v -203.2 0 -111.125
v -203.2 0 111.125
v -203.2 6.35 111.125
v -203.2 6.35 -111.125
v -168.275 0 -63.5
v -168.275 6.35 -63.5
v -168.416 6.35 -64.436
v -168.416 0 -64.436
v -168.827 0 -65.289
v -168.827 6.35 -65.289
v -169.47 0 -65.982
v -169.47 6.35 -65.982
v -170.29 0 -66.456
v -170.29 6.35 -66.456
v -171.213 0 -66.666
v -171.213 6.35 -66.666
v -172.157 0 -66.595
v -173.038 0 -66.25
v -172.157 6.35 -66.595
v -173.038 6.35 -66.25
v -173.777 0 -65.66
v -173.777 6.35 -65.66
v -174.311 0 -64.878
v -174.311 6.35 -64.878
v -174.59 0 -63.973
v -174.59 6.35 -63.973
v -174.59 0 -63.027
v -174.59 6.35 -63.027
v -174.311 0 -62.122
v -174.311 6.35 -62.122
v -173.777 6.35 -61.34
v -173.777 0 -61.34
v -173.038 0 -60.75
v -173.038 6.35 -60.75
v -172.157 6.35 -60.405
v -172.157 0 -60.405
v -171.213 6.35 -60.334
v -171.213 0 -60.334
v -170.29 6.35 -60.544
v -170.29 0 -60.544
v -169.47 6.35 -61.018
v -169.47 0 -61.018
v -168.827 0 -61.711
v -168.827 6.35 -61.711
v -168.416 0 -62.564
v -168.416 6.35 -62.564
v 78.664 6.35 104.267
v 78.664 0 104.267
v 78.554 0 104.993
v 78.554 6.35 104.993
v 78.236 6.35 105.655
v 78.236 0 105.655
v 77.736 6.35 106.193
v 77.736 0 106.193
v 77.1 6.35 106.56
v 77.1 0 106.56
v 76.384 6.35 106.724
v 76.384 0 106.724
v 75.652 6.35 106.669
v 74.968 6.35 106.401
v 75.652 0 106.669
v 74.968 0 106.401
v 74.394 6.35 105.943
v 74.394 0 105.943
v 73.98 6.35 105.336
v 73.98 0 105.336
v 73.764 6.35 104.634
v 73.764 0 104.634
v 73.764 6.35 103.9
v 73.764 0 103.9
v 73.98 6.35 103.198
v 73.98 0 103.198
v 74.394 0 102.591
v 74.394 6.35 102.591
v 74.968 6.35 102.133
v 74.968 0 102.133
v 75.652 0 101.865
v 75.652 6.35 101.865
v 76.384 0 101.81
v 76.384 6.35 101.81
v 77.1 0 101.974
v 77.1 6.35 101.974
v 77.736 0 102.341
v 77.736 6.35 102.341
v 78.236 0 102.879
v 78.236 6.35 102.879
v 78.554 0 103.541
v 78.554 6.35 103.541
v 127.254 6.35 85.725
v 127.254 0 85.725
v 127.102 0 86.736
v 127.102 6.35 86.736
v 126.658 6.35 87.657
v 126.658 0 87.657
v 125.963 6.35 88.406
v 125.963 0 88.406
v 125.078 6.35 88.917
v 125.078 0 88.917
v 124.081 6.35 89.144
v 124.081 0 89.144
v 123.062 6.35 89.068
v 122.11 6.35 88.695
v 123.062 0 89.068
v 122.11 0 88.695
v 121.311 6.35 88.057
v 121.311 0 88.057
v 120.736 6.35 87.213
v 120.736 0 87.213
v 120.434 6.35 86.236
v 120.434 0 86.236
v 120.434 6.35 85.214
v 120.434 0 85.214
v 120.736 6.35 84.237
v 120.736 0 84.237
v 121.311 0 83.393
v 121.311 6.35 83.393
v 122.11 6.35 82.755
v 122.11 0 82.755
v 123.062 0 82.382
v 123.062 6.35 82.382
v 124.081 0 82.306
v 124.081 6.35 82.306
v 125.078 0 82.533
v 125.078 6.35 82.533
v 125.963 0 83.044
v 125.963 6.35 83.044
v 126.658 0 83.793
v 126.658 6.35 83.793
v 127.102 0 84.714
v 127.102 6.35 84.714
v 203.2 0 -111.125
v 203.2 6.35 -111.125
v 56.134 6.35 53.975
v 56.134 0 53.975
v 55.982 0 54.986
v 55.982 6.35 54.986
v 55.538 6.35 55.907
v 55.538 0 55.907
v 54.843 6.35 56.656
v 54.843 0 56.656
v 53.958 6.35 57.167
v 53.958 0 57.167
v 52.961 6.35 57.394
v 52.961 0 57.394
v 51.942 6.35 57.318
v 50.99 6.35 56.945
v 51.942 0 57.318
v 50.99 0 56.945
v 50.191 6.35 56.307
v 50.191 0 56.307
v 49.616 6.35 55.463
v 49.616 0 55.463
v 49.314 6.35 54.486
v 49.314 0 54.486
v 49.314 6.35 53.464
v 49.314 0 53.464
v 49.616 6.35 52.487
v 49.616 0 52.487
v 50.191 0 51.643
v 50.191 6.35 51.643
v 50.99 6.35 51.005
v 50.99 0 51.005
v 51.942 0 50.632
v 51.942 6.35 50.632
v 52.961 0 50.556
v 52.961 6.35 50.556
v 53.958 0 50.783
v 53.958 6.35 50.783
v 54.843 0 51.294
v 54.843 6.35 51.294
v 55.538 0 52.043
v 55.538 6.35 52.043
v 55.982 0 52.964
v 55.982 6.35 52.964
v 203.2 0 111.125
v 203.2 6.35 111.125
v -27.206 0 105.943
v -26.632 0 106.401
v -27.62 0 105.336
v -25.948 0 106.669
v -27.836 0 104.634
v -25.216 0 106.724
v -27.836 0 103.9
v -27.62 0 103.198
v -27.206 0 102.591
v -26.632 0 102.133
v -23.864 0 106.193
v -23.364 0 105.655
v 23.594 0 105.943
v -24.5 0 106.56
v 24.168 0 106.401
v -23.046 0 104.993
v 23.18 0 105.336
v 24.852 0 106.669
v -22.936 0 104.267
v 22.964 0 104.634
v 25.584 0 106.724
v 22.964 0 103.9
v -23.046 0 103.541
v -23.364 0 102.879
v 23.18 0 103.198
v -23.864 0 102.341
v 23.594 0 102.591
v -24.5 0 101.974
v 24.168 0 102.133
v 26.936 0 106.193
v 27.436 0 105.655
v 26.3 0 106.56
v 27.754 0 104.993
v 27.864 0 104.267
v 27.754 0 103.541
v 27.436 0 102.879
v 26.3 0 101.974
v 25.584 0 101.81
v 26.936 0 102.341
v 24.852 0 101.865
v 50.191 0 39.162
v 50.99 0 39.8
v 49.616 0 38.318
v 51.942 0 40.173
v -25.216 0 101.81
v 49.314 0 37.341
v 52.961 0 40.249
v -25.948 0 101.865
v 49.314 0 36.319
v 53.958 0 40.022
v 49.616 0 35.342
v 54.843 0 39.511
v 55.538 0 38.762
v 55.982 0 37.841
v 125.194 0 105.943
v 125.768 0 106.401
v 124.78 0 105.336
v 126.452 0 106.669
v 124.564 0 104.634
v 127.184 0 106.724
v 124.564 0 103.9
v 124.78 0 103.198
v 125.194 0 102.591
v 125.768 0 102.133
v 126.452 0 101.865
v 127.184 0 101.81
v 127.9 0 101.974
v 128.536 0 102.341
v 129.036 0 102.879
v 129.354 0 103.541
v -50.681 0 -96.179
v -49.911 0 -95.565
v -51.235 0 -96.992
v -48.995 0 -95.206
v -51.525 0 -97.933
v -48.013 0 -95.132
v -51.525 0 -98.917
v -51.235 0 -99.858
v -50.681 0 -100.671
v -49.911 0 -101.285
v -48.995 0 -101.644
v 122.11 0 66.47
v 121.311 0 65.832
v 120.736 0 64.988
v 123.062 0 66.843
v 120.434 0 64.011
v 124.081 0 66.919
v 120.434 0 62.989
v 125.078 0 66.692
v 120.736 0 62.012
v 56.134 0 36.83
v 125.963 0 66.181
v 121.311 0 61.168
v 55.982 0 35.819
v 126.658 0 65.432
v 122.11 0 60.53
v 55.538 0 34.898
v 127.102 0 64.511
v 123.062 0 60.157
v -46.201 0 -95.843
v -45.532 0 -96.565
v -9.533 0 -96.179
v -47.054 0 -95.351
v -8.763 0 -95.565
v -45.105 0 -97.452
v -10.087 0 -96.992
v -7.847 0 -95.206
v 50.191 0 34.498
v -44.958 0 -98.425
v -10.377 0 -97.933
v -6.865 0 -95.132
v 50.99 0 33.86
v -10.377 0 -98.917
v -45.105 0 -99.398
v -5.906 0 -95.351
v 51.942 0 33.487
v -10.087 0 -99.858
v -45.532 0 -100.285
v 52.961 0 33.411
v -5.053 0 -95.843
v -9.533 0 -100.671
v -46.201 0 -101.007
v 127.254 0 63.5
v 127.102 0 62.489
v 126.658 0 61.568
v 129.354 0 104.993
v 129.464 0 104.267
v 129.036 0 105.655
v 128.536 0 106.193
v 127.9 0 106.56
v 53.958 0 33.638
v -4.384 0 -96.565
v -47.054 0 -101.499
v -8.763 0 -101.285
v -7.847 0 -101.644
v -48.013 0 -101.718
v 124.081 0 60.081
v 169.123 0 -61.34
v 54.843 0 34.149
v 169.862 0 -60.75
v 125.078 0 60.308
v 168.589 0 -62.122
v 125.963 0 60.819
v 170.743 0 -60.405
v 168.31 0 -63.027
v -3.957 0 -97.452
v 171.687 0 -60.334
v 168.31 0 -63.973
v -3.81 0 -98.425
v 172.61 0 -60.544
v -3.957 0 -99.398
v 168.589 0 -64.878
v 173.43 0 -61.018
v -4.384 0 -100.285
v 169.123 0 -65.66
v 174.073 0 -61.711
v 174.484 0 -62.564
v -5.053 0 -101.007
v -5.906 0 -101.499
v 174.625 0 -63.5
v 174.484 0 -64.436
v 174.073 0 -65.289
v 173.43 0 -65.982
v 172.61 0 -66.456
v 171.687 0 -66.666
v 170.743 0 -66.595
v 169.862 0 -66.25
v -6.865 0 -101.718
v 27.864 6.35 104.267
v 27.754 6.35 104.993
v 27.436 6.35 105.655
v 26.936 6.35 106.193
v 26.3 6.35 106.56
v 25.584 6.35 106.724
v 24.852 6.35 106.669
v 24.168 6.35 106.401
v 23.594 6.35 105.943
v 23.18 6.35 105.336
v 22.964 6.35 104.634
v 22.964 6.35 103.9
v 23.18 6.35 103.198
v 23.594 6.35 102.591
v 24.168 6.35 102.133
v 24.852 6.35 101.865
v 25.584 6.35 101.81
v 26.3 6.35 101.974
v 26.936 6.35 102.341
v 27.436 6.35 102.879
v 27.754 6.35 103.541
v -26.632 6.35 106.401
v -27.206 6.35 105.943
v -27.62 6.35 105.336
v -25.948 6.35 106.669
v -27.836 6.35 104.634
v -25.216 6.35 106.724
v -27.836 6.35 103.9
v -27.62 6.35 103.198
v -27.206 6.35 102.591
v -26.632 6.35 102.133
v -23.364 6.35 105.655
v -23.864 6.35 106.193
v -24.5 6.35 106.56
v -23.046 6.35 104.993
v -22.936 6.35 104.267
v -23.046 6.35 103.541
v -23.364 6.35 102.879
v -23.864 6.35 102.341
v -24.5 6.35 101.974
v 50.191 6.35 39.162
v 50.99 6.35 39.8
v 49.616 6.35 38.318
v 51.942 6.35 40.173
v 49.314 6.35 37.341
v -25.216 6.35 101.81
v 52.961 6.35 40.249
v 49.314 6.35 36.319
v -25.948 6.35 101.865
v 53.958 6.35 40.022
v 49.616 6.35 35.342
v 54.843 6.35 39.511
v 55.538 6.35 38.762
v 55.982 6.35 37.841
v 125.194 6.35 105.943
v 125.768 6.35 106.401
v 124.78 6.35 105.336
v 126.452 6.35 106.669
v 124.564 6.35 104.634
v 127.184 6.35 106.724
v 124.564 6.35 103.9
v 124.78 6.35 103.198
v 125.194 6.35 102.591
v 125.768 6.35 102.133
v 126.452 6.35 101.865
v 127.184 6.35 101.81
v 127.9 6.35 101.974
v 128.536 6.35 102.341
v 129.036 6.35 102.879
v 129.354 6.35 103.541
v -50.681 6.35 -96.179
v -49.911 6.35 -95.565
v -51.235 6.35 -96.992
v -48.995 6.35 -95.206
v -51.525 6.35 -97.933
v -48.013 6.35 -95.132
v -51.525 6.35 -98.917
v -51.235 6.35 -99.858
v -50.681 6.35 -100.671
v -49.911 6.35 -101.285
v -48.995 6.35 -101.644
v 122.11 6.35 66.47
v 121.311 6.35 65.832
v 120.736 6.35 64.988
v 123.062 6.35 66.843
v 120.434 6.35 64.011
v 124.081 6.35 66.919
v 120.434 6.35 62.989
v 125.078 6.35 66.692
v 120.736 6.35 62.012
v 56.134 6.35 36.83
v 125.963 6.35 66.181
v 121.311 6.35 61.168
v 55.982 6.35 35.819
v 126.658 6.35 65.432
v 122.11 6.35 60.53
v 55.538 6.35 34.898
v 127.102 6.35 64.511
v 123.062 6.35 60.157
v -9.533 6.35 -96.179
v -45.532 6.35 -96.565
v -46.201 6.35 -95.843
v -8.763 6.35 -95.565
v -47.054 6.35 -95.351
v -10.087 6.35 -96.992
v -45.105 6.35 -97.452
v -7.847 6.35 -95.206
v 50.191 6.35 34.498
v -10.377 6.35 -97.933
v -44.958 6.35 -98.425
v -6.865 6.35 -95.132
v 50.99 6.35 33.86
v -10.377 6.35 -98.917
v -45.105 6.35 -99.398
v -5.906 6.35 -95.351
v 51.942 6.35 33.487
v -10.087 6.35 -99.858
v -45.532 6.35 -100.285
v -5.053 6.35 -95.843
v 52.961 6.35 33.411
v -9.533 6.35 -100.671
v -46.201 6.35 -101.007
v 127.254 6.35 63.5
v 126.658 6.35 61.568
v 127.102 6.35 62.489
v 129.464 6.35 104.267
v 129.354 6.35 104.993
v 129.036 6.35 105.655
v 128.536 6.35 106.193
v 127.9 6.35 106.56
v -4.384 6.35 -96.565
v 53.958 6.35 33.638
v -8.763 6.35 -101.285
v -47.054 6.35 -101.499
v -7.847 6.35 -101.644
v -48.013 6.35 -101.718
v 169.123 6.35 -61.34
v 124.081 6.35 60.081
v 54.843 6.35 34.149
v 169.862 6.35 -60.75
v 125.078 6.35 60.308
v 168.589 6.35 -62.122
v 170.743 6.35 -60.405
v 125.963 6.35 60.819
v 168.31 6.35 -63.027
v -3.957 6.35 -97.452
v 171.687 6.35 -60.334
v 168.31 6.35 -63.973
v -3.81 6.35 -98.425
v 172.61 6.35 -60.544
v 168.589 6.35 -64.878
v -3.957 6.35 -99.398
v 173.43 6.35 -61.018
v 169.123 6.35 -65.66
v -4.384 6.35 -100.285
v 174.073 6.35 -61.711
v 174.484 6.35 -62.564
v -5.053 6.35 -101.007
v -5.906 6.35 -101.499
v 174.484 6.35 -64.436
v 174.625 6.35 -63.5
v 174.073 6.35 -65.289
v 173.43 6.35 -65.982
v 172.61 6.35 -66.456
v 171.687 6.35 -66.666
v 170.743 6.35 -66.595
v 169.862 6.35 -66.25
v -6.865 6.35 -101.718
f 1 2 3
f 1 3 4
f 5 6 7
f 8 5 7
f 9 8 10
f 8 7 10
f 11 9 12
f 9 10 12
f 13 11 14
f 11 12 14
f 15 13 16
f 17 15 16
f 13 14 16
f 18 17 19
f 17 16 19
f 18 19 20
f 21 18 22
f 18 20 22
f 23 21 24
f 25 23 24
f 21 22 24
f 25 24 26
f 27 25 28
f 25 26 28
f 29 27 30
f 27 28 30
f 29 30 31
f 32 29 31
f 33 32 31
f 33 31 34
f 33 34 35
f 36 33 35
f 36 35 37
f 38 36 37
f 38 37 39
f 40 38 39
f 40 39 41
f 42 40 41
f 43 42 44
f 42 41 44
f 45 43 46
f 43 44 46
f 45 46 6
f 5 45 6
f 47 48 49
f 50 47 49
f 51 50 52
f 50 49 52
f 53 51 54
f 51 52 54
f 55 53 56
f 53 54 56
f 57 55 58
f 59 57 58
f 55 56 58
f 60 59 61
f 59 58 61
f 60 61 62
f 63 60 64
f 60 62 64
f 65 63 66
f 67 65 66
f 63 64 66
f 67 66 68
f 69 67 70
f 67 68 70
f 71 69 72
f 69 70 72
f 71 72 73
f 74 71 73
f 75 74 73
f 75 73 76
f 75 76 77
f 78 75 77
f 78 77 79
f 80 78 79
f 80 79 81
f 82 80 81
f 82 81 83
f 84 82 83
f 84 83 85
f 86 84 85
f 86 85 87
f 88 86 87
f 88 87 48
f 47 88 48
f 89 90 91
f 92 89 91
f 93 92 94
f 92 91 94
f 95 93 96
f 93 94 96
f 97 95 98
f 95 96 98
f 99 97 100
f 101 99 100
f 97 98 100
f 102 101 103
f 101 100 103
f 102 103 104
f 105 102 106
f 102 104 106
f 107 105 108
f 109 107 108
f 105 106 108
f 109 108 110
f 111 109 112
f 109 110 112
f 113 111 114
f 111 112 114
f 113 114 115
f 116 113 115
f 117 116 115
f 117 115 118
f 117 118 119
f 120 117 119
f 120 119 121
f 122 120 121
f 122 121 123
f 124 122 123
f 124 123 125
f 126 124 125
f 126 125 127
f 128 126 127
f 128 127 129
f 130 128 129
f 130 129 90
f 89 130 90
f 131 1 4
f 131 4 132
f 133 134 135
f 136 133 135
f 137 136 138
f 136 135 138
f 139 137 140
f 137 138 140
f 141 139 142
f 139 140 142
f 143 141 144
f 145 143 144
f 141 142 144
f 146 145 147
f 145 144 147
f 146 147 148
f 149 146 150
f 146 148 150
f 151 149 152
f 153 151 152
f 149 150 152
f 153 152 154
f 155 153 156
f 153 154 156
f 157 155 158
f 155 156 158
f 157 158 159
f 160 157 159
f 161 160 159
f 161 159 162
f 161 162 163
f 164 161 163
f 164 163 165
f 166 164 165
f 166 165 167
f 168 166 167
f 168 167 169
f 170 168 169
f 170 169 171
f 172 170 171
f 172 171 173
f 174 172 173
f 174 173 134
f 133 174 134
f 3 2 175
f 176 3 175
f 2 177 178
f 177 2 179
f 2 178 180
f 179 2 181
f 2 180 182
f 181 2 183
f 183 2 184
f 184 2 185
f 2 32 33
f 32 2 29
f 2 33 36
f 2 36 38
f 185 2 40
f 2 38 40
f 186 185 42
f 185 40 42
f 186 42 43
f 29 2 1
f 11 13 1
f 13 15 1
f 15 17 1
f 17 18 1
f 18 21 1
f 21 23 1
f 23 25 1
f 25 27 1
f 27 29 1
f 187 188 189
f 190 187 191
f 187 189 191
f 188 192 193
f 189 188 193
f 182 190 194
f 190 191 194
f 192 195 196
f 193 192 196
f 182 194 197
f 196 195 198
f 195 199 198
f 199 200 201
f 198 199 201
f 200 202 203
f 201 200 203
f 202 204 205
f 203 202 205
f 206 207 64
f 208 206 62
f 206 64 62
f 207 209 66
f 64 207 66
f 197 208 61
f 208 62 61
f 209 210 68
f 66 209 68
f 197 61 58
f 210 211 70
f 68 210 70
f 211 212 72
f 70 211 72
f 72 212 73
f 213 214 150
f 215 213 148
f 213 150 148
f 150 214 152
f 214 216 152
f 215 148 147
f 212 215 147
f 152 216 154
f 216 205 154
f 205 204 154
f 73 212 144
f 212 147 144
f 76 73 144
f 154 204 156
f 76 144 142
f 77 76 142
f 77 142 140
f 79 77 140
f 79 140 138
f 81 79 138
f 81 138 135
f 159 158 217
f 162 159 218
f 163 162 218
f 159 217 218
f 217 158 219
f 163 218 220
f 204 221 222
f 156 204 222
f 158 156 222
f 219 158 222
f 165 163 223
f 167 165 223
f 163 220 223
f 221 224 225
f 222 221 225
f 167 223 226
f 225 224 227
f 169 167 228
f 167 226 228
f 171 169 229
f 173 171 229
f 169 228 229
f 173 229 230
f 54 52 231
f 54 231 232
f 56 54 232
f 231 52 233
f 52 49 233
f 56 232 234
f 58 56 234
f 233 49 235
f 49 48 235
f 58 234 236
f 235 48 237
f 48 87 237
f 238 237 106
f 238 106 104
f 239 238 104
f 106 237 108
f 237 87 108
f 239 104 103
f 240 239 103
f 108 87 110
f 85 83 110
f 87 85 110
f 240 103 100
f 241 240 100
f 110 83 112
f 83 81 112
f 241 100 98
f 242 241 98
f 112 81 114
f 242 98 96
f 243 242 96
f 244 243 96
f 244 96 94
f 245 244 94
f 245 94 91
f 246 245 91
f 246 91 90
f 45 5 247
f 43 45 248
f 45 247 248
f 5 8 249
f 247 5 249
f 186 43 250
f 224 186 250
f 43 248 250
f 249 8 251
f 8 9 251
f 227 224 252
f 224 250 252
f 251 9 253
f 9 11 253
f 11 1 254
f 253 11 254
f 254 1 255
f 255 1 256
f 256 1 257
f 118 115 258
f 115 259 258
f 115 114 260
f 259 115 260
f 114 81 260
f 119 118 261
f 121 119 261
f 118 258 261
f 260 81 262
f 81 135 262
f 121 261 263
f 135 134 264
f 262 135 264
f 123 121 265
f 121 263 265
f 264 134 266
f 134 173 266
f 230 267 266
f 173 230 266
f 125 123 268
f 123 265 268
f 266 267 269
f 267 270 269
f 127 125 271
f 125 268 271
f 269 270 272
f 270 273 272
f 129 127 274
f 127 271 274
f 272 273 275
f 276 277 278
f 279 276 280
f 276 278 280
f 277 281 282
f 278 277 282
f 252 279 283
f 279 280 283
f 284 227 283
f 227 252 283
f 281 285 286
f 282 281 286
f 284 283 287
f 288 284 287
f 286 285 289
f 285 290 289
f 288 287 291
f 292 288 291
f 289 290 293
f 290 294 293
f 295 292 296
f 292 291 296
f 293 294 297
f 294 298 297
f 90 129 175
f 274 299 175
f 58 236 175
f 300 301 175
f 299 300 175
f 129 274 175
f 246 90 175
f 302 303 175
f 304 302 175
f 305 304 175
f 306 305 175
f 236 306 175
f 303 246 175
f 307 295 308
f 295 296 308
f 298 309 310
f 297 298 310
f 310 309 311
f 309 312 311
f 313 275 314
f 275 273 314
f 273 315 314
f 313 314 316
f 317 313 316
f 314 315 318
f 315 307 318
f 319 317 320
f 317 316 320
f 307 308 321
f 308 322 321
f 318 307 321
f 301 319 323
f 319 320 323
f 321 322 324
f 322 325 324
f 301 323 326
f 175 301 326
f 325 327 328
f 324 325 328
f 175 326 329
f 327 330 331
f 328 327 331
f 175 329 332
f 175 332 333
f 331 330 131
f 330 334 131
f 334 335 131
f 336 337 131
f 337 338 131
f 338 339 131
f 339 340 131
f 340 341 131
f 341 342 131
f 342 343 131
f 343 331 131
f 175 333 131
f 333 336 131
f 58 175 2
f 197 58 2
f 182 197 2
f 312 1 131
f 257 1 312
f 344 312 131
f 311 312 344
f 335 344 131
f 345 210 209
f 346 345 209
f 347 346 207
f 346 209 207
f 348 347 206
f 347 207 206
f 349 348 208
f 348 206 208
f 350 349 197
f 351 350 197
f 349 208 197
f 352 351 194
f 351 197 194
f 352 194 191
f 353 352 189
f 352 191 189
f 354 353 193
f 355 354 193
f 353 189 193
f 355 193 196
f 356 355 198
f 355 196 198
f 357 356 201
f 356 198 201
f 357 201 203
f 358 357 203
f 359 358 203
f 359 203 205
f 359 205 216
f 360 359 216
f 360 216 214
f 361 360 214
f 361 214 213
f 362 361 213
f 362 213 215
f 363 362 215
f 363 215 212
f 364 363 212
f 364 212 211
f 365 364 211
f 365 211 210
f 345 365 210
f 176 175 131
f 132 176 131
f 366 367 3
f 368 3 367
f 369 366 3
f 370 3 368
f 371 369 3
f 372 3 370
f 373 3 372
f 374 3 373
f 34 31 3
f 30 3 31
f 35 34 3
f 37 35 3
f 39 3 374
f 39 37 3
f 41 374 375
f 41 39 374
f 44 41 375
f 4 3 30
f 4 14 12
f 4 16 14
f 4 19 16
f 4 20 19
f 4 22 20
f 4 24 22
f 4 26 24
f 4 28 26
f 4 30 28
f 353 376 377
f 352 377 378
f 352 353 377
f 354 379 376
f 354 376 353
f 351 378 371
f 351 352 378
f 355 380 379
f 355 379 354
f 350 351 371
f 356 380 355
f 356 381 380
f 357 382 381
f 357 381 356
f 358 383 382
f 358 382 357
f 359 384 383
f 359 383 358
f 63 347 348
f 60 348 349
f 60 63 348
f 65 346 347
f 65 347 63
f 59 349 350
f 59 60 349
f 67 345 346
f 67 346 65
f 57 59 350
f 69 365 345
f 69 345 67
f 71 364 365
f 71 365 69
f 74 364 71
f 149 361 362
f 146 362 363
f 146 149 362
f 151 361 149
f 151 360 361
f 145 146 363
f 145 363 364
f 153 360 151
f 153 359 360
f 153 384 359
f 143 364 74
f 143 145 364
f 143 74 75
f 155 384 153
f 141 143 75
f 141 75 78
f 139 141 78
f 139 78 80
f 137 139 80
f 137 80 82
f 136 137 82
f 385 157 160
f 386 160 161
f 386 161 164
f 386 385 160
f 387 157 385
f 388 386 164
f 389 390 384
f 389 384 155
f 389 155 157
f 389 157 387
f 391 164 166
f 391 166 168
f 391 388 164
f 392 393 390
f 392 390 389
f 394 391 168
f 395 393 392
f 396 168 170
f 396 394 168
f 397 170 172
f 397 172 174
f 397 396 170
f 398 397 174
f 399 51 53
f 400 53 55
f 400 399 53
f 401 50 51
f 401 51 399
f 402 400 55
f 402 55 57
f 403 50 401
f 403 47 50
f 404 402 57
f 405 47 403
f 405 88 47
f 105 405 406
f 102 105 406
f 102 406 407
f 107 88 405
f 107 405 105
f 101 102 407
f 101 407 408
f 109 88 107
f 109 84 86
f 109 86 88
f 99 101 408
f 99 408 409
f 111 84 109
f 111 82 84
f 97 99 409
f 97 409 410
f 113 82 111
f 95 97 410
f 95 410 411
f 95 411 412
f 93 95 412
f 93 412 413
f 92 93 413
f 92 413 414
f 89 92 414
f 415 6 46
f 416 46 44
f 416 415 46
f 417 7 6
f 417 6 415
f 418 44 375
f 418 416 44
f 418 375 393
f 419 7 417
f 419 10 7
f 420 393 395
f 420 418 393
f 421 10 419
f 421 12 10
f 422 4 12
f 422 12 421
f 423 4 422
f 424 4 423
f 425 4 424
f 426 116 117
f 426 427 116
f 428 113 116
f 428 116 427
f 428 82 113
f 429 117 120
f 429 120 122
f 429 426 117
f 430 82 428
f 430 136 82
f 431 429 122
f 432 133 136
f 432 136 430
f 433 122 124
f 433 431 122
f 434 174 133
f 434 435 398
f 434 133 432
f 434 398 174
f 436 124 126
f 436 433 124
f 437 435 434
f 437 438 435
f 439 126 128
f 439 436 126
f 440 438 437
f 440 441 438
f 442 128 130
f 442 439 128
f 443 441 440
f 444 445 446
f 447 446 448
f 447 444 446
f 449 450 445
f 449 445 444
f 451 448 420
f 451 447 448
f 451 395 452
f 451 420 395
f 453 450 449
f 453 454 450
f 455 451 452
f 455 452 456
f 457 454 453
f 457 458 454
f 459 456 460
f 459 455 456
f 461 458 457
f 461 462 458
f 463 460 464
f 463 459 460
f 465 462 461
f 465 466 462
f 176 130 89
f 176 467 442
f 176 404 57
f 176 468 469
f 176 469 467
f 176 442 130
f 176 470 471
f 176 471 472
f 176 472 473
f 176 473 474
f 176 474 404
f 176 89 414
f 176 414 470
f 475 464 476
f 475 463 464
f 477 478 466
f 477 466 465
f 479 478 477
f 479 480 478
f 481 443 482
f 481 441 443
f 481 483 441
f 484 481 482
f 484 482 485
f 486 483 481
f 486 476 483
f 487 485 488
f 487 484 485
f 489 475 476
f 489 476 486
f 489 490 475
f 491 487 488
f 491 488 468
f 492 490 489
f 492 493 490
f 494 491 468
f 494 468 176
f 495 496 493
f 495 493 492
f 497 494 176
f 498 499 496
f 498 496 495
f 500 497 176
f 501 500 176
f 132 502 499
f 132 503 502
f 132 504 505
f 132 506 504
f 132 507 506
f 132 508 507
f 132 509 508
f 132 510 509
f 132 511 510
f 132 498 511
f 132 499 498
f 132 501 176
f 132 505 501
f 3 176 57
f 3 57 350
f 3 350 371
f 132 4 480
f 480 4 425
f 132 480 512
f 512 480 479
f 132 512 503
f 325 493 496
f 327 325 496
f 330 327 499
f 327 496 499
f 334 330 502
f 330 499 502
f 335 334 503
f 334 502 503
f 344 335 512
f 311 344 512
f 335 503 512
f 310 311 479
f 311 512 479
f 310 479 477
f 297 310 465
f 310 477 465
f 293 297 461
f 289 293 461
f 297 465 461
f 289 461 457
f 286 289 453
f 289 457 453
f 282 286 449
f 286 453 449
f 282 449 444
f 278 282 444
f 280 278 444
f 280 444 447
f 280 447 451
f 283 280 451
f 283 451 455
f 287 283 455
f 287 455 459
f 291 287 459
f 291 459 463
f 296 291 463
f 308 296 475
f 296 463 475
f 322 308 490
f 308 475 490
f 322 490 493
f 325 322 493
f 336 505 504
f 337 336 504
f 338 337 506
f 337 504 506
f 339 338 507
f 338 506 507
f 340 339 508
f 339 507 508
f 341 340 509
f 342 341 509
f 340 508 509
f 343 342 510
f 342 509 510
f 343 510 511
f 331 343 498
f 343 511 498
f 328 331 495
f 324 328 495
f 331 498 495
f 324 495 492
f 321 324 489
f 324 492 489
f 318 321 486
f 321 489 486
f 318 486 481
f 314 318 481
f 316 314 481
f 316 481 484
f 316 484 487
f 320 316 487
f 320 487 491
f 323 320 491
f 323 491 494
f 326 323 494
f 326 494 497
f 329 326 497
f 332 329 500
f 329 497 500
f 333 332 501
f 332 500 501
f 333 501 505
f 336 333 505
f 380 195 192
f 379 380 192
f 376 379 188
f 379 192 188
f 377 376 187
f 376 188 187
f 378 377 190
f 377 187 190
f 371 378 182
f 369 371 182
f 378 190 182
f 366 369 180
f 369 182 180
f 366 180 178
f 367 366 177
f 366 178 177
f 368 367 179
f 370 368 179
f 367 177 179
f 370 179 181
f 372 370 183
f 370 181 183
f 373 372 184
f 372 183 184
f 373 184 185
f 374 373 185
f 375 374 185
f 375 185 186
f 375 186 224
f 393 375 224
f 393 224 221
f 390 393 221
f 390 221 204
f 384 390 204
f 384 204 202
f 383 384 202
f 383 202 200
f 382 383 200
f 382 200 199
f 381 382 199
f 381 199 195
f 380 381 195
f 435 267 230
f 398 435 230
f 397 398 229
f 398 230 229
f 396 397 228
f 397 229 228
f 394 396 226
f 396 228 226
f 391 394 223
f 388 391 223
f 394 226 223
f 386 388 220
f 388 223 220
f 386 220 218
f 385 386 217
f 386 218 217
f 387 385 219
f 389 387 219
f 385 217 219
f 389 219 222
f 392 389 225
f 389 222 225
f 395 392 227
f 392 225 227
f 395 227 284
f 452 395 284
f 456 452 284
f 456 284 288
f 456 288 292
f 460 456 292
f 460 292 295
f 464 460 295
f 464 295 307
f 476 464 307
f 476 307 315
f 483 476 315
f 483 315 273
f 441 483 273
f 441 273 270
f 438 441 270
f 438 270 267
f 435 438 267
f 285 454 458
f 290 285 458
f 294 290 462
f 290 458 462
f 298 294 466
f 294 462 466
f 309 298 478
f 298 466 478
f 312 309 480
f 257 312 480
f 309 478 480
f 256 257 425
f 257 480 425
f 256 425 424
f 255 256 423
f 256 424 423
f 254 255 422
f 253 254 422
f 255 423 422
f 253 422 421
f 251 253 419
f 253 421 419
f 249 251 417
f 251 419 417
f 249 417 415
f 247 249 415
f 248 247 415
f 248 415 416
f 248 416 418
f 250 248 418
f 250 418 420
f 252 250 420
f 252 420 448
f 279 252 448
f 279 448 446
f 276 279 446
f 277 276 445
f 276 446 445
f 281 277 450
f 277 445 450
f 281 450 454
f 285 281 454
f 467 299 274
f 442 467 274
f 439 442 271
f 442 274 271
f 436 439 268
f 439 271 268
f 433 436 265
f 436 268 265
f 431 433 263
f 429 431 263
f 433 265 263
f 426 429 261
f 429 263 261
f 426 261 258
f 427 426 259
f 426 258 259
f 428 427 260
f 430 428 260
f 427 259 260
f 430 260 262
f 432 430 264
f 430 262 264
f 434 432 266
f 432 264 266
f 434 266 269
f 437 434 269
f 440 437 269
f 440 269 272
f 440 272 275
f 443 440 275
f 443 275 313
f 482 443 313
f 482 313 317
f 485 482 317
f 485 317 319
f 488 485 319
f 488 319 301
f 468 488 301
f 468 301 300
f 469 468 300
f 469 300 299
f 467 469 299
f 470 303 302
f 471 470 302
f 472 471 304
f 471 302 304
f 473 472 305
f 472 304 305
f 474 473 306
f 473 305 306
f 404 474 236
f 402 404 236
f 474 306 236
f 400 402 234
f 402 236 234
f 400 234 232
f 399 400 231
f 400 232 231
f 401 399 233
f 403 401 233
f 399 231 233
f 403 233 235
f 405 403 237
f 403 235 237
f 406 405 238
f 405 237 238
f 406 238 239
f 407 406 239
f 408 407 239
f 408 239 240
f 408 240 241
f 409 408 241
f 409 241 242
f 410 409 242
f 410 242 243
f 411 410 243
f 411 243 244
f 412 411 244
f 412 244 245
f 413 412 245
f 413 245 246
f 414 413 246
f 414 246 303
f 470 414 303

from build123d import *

# Parameters (mm, degrees)
SKETCH1_W           = 406.4
SKETCH1_H           = 222.25
BOSS_EXTRUDE1_DEPTH = 6.35
SKETCH2_R           = 3.302
SKETCH2_R_2         = 3.175
CUT_EXTRUDE1_DEPTH  = 6.35
SKETCH3_R           = 2.4638
CUT_EXTRUDE2_DEPTH  = 7.35
CUT_EXTRUDE3_REACH  = 8.35
SKETCH4_R           = 3.429


with BuildPart() as part:
    # Sketch1 → Boss-Extrude1 (new body)
    with BuildSketch(Plane(origin=(0, 0, 0), x_dir=(1, 0, 0), z_dir=(0, 1, 0))):
        Rectangle(SKETCH1_W, SKETCH1_H)
    extrude(amount=BOSS_EXTRUDE1_DEPTH)

    # Sketch2 → Cut-Extrude1 (cut)
    with BuildSketch(Plane(origin=(0, 6.35, 0), x_dir=(1, 0, 0), z_dir=(0, 1, 0))):
        with Locations((-48.26, 98.425)):
            Circle(SKETCH2_R)
        with Locations((-7.112, 98.425)):
            Circle(SKETCH2_R)
        with Locations((-171.45, 63.5)):
            Circle(SKETCH2_R_2)
        with Locations((171.45, 63.5)):
            Circle(SKETCH2_R_2)
    extrude(amount=-CUT_EXTRUDE1_DEPTH, mode=Mode.SUBTRACT)

    # Sketch3 → Cut-Extrude2 (cut, through all)
    with BuildSketch(Plane.XZ):
        with Locations((127, 104.267)):
            Circle(SKETCH3_R)
        with Locations((76.2, 104.267)):
            Circle(SKETCH3_R)
        with Locations((25.4, 104.267)):
            Circle(SKETCH3_R)
        with Locations((-25.4, 104.267)):
            Circle(SKETCH3_R)
    extrude(amount=-CUT_EXTRUDE2_DEPTH, mode=Mode.SUBTRACT)

    # Sketch4 → Cut-Extrude3 (cut, up to next)
    with BuildSketch(Plane.XZ, mode=Mode.PRIVATE) as cut_extrude3_sk1:
        with Locations((52.705, 36.83)):
            Circle(SKETCH4_R)
    cut_extrude3_tool1 = extrude(cut_extrude3_sk1.sketch, amount=-CUT_EXTRUDE3_REACH, mode=Mode.PRIVATE) & part.part
    add(cut_extrude3_tool1.solids().sort_by_distance((52.705, 0, 36.83))[0], mode=Mode.SUBTRACT)
    # Sketch4 → Cut-Extrude3 (cut, up to next)
    with BuildSketch(Plane.XZ, mode=Mode.PRIVATE) as cut_extrude3_sk2:
        with Locations((52.705, 53.975)):
            Circle(SKETCH4_R)
    cut_extrude3_tool2 = extrude(cut_extrude3_sk2.sketch, amount=-CUT_EXTRUDE3_REACH, mode=Mode.PRIVATE) & part.part
    add(cut_extrude3_tool2.solids().sort_by_distance((52.705, 0, 53.975))[0], mode=Mode.SUBTRACT)
    # Sketch4 → Cut-Extrude3 (cut, up to next)
    with BuildSketch(Plane.XZ, mode=Mode.PRIVATE) as cut_extrude3_sk3:
        with Locations((123.825, 63.5)):
            Circle(SKETCH4_R)
    cut_extrude3_tool3 = extrude(cut_extrude3_sk3.sketch, amount=-CUT_EXTRUDE3_REACH, mode=Mode.PRIVATE) & part.part
    add(cut_extrude3_tool3.solids().sort_by_distance((123.825, 0, 63.5))[0], mode=Mode.SUBTRACT)
    # Sketch4 → Cut-Extrude3 (cut, up to next)
    with BuildSketch(Plane.XZ, mode=Mode.PRIVATE) as cut_extrude3_sk4:
        with Locations((123.825, 85.725)):
            Circle(SKETCH4_R)
    cut_extrude3_tool4 = extrude(cut_extrude3_sk4.sketch, amount=-CUT_EXTRUDE3_REACH, mode=Mode.PRIVATE) & part.part
    add(cut_extrude3_tool4.solids().sort_by_distance((123.825, 0, 85.725))[0], mode=Mode.SUBTRACT)


solid = part.part
